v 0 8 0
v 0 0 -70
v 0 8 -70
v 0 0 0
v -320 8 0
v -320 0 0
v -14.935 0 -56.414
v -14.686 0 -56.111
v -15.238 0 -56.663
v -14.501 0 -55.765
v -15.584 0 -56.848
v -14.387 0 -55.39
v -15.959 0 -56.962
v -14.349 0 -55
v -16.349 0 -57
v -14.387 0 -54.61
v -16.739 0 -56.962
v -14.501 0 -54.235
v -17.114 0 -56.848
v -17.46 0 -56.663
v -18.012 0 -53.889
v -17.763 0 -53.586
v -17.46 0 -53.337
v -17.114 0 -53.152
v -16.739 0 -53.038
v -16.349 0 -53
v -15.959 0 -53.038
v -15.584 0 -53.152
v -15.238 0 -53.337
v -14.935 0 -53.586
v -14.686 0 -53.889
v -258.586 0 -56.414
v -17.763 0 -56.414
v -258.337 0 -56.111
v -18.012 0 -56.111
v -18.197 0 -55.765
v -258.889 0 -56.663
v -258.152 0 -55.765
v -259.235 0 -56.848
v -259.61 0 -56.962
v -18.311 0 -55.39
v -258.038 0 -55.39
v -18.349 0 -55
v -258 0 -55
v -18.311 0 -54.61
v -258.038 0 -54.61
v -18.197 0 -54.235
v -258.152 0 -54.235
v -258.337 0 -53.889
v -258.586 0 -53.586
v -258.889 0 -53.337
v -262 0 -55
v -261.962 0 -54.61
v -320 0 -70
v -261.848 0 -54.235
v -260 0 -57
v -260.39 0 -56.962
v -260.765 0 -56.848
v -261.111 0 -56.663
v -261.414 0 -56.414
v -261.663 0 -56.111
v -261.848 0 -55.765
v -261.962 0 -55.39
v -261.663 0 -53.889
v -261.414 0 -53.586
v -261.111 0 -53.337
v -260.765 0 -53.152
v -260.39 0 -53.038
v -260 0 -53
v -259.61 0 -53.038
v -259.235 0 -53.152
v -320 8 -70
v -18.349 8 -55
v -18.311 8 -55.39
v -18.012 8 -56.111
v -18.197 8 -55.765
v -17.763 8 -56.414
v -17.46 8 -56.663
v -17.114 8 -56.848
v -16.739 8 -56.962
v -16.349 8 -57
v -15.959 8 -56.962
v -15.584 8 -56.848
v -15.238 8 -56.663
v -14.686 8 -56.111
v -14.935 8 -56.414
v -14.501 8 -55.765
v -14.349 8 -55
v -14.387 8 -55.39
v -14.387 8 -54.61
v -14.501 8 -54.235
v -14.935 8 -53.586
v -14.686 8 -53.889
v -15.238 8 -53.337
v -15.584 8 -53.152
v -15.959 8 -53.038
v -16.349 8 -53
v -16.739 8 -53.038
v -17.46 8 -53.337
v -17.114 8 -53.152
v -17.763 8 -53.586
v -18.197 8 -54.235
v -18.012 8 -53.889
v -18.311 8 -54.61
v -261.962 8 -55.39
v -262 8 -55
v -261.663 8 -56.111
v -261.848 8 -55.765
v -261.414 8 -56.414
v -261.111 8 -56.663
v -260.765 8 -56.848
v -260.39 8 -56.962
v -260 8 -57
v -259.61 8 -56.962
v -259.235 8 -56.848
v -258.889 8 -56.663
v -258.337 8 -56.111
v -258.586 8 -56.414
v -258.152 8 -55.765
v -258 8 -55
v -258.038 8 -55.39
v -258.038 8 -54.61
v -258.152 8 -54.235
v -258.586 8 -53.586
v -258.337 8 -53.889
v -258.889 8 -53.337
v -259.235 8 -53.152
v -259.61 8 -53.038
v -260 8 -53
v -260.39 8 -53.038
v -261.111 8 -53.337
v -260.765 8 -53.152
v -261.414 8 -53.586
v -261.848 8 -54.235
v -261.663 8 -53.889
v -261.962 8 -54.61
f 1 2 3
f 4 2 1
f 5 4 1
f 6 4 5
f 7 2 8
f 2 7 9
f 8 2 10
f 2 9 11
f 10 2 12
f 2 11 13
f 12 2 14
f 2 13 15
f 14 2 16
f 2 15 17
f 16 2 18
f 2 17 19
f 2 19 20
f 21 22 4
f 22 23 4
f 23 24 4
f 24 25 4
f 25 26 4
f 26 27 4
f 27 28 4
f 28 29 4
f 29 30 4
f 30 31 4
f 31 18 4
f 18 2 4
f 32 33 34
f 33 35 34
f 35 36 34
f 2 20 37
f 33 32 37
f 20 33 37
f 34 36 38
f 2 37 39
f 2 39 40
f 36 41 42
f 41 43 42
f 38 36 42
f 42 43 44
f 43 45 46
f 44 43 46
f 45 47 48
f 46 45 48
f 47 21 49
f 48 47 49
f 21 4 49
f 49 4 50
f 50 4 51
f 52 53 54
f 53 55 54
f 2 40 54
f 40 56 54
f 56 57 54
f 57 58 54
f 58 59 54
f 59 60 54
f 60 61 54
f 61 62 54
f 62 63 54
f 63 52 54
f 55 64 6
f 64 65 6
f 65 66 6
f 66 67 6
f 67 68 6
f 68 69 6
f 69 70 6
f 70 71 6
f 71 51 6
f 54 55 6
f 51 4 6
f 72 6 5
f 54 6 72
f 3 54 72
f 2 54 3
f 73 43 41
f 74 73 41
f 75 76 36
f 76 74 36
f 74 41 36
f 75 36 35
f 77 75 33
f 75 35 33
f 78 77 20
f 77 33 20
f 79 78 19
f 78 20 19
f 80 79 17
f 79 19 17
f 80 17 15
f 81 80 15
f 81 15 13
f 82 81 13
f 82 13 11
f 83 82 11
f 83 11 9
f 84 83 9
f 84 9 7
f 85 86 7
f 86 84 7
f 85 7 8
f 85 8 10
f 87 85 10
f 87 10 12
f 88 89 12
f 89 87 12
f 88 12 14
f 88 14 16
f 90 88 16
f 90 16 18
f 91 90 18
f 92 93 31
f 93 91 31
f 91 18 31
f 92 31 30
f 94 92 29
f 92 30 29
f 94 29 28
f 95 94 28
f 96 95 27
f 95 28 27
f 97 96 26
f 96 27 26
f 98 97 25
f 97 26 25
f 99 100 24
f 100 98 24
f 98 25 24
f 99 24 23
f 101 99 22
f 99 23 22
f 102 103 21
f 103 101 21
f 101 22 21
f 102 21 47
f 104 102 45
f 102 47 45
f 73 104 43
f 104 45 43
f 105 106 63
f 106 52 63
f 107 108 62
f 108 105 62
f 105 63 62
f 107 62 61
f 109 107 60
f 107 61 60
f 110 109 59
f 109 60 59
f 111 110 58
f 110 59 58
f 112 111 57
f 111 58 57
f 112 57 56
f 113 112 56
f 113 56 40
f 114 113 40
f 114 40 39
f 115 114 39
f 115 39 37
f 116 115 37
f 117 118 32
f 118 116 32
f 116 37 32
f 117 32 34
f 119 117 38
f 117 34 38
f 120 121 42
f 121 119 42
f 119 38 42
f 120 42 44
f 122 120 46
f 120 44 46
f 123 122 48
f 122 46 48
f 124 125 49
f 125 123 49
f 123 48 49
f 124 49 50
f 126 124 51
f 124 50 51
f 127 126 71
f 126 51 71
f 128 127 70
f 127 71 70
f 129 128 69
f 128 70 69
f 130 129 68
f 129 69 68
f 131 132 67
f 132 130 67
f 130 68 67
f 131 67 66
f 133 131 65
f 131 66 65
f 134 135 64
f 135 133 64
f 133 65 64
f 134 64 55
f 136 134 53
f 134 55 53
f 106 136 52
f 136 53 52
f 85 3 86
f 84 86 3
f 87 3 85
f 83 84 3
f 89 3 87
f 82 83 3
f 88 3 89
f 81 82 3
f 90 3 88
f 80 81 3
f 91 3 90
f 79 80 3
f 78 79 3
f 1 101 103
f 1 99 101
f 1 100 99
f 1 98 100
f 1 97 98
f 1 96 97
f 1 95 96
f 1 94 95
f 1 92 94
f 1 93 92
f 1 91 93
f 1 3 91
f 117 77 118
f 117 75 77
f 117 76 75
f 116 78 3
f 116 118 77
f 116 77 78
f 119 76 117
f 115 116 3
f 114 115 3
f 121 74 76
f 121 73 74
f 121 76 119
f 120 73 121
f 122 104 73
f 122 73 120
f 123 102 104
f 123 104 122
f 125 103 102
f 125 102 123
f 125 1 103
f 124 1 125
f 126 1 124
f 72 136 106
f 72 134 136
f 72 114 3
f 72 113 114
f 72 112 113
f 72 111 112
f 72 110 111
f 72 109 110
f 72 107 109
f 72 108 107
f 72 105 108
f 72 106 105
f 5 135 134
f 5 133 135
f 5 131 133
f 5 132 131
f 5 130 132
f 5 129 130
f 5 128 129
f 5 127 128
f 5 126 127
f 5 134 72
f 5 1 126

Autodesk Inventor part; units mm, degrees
ref_plane "YZ Plane" through (0, 0, 0) normal (1, 0, 0) x (0, 1, 0)
ref_plane "XZ Plane" through (0, 0, 0) normal (0, 1, 0) x (-1, 0, 0)
ref_plane "XY Plane" through (0, 0, 0) normal (0, 0, 1) x (1, 0, 0)
sketch "Sketch1" plane through (0, 0, 0) normal (0, 1, 0) x (-1, 0, 0)
  line L0 (0, 0) -> (320, 0)
  line L1 (320, 0) -> (320, -70)
  line L2 (320, -70) -> (0, -70)
  line L3 (0, -70) -> (0, 0)
  circle A0 centre (260, -55) radius 2
  circle A1 centre (16.349, -55) radius 2
  dimension "d0" = 320
  dimension "d1" = 70
  dimension "d2" = 4
  dimension "d3" = 4
  dimension "d4" = 243.651
  dimension "d5" = 60
  dimension "d6" = 15
  dimension "d7" = 15
extrude "Extrusion1" add sketch "Sketch1" along normal blind 8
equation "\"d7\" = d6"
properties part number "Wing_base"
